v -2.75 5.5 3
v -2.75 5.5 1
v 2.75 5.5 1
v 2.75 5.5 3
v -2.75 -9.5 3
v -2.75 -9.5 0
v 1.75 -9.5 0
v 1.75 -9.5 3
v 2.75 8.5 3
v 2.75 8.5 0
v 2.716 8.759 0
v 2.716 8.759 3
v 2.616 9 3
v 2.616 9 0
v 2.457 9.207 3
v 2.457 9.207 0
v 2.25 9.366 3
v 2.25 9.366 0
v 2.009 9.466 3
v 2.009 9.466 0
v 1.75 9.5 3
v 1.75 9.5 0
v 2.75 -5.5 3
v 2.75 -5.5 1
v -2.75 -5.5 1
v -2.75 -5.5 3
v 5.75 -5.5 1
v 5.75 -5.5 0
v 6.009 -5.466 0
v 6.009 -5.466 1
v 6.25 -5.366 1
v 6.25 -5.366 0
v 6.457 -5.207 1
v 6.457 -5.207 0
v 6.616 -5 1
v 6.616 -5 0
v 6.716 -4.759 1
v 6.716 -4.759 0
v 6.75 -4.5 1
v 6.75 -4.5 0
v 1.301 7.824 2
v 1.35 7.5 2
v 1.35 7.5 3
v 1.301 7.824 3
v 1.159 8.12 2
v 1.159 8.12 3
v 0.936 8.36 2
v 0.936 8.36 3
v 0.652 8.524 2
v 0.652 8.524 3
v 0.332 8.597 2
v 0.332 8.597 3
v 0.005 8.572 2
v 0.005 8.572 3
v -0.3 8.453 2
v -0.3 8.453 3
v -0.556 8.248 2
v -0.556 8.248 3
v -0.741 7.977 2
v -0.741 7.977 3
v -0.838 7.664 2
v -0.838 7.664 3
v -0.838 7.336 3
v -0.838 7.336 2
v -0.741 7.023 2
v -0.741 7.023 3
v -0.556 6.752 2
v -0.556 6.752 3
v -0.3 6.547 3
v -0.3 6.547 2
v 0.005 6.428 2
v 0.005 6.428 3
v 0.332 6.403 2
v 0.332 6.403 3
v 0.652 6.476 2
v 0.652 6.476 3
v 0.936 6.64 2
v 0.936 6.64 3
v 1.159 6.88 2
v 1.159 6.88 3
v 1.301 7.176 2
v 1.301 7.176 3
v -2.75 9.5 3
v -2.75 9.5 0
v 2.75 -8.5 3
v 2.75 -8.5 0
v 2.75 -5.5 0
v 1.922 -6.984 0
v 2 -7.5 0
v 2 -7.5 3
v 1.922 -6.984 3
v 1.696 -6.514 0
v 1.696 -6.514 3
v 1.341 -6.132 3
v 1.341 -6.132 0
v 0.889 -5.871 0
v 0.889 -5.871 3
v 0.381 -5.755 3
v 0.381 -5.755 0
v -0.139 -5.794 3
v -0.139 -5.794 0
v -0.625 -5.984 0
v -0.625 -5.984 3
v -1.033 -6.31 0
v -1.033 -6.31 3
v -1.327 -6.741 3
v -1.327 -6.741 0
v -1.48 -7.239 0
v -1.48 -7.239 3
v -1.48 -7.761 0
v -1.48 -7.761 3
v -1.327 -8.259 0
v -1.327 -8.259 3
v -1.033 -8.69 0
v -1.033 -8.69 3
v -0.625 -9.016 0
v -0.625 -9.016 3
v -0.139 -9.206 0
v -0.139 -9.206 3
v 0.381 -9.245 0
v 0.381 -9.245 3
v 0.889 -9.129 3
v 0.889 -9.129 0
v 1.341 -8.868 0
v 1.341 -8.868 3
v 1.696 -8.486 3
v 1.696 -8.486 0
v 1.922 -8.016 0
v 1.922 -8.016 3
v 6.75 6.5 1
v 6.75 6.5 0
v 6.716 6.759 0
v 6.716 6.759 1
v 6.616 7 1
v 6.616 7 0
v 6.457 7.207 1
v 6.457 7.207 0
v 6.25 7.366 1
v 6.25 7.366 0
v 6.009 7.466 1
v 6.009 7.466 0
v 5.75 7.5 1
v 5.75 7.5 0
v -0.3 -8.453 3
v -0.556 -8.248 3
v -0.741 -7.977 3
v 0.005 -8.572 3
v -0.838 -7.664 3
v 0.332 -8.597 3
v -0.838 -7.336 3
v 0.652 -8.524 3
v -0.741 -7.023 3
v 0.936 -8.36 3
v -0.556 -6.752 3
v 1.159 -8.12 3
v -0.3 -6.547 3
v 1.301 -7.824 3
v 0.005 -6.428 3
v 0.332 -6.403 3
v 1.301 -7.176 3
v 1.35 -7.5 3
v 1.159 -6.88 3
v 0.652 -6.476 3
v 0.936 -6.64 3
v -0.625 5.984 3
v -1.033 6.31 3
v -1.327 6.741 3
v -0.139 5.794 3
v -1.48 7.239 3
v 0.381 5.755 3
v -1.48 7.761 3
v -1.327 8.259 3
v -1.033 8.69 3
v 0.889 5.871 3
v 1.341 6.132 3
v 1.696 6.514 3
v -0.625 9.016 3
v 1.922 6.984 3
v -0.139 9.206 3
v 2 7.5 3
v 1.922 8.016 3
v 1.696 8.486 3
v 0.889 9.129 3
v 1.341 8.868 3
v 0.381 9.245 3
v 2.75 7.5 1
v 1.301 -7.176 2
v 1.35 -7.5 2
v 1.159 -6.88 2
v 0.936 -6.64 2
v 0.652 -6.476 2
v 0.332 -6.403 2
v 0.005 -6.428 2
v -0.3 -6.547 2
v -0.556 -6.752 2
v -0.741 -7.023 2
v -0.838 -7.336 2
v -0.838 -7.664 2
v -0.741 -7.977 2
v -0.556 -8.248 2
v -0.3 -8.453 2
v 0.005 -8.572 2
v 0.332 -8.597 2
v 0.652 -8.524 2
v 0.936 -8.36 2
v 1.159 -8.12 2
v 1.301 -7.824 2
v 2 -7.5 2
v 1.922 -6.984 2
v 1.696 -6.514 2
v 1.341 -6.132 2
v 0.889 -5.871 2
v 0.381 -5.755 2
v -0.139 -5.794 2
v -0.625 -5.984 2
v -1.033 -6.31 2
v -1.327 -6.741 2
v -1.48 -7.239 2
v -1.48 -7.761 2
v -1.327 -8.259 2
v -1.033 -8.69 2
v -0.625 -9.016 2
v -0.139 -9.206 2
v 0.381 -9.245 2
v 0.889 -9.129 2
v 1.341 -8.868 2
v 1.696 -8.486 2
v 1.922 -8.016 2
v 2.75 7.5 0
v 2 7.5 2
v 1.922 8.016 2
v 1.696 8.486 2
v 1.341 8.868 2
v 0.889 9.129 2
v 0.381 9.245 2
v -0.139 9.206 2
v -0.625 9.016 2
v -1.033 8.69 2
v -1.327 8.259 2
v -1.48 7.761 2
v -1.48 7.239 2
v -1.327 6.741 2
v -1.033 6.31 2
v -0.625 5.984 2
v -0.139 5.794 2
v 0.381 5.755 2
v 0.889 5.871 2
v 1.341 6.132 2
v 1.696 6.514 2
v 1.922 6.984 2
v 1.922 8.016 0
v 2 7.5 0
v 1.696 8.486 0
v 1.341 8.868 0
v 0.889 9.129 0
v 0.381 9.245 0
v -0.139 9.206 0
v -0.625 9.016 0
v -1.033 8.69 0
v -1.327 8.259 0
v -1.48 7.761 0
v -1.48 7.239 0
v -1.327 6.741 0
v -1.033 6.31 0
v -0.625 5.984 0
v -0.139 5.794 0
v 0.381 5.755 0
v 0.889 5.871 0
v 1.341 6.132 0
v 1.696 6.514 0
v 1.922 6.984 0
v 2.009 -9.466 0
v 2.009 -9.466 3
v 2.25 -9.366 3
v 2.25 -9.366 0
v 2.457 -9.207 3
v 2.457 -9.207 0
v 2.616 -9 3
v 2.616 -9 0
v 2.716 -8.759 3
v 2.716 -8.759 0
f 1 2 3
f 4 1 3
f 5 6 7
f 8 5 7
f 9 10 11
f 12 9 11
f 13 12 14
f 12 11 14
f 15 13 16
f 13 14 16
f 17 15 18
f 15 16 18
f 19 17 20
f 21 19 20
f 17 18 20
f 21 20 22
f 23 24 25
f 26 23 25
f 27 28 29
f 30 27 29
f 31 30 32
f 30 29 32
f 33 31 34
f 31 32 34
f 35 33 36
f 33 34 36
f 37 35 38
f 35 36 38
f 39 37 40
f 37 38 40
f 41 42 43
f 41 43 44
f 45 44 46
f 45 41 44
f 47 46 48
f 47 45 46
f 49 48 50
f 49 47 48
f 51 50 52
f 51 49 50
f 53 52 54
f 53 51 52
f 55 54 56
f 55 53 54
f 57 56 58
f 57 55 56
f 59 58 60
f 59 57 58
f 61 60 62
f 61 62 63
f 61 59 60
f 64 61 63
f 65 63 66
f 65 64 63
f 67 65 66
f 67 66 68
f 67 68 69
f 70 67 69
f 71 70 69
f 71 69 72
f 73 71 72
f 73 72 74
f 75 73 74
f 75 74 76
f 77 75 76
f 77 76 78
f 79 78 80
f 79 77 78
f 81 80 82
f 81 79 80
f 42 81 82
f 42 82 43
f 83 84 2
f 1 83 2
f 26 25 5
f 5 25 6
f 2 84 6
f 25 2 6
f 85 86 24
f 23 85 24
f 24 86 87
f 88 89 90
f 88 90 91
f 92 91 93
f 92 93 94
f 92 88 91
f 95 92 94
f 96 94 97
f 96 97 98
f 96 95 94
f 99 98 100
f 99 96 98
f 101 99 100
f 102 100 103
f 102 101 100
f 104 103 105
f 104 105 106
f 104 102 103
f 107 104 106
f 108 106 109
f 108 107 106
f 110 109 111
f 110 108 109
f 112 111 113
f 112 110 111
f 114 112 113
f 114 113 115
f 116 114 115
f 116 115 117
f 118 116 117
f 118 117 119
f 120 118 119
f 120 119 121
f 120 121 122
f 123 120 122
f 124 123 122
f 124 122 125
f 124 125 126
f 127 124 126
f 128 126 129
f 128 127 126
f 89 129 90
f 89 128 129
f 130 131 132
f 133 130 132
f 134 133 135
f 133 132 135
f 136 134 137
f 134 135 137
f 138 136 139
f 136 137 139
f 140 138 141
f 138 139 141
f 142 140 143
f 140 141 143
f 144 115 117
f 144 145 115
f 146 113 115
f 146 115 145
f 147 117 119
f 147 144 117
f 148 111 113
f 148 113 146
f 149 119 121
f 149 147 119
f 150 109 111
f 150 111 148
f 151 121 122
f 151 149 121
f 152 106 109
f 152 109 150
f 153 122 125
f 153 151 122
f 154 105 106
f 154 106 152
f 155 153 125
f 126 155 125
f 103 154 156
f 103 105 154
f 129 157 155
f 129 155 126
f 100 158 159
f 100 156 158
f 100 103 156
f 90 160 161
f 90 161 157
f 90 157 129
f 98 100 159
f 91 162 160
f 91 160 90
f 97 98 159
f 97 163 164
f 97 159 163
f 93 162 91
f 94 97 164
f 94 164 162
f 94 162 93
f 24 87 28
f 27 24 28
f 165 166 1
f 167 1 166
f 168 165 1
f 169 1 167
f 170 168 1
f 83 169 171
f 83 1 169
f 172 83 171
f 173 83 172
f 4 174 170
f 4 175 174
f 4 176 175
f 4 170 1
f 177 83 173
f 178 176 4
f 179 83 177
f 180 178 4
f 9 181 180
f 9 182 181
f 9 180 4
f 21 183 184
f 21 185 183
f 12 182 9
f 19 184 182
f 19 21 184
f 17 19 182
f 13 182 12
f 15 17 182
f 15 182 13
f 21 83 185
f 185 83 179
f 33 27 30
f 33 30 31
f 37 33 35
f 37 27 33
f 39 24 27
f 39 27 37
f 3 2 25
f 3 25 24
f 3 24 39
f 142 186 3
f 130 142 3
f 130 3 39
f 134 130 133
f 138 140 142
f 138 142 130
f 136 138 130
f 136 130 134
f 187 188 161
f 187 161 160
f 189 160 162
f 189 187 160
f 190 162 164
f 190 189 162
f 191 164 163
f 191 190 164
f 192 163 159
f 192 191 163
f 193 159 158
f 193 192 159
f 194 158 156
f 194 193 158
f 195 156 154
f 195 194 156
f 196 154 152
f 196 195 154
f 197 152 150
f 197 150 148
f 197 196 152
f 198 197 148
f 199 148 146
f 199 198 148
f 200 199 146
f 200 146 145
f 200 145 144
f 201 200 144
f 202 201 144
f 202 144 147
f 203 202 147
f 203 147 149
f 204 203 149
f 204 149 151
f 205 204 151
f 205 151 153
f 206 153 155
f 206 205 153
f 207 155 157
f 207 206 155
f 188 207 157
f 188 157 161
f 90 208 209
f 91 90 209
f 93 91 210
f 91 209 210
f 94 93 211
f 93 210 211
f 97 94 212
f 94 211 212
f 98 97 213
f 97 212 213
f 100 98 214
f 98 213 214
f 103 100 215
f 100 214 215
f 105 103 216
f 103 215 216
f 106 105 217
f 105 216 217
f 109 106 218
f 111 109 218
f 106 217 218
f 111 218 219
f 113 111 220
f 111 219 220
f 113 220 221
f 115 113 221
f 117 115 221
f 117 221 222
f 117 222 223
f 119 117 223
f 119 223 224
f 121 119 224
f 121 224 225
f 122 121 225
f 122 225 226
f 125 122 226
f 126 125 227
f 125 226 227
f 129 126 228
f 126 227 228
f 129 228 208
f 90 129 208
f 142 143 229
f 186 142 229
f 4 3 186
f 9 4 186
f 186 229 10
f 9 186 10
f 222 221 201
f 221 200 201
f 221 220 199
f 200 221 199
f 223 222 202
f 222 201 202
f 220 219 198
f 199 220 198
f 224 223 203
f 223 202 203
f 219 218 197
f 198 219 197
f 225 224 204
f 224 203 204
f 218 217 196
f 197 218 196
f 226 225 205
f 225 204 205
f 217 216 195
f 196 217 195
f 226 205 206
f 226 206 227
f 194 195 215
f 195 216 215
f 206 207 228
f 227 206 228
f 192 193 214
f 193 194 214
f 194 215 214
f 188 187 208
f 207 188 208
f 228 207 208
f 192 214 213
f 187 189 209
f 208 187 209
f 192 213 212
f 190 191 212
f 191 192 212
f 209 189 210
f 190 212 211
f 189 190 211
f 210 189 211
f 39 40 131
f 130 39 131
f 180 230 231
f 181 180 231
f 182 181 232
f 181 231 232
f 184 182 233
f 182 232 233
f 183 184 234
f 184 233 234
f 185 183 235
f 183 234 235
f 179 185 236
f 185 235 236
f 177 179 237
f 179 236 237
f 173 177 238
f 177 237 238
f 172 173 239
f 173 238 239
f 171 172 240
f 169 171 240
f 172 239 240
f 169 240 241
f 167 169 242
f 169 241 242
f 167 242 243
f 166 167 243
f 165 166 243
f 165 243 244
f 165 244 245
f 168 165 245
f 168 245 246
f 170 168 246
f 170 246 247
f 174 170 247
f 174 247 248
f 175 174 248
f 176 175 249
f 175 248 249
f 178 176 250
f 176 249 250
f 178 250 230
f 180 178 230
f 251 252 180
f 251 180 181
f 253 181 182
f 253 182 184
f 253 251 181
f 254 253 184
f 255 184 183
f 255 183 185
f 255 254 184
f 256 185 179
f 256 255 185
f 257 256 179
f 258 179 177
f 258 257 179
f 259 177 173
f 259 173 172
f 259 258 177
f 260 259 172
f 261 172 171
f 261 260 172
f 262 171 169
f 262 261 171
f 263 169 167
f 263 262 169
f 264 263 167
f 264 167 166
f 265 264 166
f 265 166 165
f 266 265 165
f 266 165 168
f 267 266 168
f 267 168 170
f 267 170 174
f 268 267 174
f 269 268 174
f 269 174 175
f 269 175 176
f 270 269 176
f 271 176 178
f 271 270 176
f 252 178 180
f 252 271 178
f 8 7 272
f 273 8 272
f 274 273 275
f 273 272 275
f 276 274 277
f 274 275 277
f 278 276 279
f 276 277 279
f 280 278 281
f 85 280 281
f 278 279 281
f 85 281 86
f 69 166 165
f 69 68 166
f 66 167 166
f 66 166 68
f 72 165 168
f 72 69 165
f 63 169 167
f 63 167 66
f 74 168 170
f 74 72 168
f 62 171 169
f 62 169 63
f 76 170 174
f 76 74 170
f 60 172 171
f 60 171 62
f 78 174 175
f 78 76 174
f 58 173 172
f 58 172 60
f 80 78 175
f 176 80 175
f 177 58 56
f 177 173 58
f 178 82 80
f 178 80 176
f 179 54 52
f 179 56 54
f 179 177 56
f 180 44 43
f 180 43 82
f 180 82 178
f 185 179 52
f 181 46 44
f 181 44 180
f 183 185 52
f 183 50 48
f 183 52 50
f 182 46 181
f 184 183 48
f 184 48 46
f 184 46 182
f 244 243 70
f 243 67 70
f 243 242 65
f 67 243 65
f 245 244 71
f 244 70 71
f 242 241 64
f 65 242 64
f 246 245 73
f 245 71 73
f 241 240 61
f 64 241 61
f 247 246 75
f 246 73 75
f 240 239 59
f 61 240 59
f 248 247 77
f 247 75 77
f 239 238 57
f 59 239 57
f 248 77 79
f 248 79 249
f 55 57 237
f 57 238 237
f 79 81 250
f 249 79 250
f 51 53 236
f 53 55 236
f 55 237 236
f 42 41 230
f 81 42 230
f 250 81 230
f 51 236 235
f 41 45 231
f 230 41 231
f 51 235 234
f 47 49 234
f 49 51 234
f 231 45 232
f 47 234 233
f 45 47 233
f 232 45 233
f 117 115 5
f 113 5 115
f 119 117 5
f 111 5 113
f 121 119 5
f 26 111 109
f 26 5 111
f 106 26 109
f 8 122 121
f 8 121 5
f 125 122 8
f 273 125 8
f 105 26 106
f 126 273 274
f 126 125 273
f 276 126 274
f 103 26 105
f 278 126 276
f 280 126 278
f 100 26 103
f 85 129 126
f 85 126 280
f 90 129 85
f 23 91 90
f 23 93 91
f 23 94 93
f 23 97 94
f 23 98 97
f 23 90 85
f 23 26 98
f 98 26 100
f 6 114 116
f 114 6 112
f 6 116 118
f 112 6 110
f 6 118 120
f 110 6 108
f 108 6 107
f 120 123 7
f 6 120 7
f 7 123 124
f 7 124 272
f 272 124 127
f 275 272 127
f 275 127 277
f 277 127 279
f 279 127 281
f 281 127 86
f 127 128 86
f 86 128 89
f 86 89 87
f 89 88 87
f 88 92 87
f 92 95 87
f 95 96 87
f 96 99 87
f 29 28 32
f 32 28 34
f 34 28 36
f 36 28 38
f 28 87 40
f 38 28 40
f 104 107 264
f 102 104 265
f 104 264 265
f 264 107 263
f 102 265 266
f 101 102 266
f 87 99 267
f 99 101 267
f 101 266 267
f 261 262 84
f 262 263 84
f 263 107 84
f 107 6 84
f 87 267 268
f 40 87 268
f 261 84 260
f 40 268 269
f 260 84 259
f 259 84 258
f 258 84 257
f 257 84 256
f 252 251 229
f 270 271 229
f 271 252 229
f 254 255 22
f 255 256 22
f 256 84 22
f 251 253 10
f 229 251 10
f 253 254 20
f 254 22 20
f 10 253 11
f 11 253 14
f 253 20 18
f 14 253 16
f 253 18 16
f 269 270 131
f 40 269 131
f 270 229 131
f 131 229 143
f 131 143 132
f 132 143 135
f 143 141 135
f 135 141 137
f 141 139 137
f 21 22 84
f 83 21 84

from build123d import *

# Parameters (mm, degrees)
F0_W     = 5.5
F0_H     = 11
F1_DEPTH = 1
F0_R     = 1.75
F2_DEPTH = 3
F3_START = 2
F0_R_2   = 1.1
F3_DEPTH = 1


with BuildPart() as f1:
    # F0 (on Top) → F1 (new body)
    with BuildSketch(Plane.XY):
        Rectangle(F0_W, F0_H)
        with BuildLine():
            Line((2.75, 7.5), (2.75, 5.5))
            Line((2.75, 5.5), (2.75, -5.5))
            Line((2.75, -5.5), (5.75, -5.5))
            ThreePointArc((5.75, -5.5), (6.4571067812, -5.2071067812), (6.75, -4.5))
            Line((6.75, -4.5), (6.75, 6.5))
            ThreePointArc((6.75, 6.5), (6.4571067812, 7.2071067812), (5.75, 7.5))
            Line((5.75, 7.5), (2.75, 7.5))
        make_face()
    extrude(amount=F1_DEPTH)

    # F0 (on Top) → F2 (join)
    with BuildSketch(Plane.XY):
        with BuildLine():
            Line((1.75, 9.5), (-2.75, 9.5))
            Line((-2.75, 9.5), (-2.75, 5.5))
            Line((-2.75, 5.5), (2.75, 5.5))
            Line((2.75, 5.5), (2.75, 7.5))
            Line((2.75, 7.5), (2.75, 8.5))
            ThreePointArc((2.75, 8.5), (2.4571067812, 9.2071067812), (1.75, 9.5))
        make_face()
        with Locations((0.25, 7.5)):
            Circle(F0_R, mode=Mode.SUBTRACT)
        with BuildLine():
            Line((2.75, -5.5), (-2.75, -5.5))
            Line((-2.75, -5.5), (-2.75, -9.5))
            Line((-2.75, -9.5), (1.75, -9.5))
            ThreePointArc((1.75, -9.5), (2.4571067812, -9.2071067812), (2.75, -8.5))
            Line((2.75, -8.5), (2.75, -5.5))
        make_face()
        with Locations((0.25, -7.5)):
            Circle(F0_R, mode=Mode.SUBTRACT)
    extrude(amount=F2_DEPTH)


with BuildPart() as f3:
    # F0 (on Top) → F3 (new body)
    with BuildSketch(Plane.XY.offset(F3_START)):
        with Locations((0.25, 7.5)):
            Circle(F0_R)
        with Locations((0.25, 7.5)):
            Circle(F0_R_2, mode=Mode.SUBTRACT)
    extrude(amount=F3_DEPTH)


with BuildPart() as f3b:
    # F0 (on Top) → F3, piece 2 (new body)
    with BuildSketch(Plane.XY.offset(F3_START)):
        with Locations((0.25, -7.5)):
            Circle(F0_R)
        with Locations((0.25, -7.5)):
            Circle(F0_R_2, mode=Mode.SUBTRACT)
    extrude(amount=F3_DEPTH)


solid = Compound([f1.part, f3.part, f3b.part])
